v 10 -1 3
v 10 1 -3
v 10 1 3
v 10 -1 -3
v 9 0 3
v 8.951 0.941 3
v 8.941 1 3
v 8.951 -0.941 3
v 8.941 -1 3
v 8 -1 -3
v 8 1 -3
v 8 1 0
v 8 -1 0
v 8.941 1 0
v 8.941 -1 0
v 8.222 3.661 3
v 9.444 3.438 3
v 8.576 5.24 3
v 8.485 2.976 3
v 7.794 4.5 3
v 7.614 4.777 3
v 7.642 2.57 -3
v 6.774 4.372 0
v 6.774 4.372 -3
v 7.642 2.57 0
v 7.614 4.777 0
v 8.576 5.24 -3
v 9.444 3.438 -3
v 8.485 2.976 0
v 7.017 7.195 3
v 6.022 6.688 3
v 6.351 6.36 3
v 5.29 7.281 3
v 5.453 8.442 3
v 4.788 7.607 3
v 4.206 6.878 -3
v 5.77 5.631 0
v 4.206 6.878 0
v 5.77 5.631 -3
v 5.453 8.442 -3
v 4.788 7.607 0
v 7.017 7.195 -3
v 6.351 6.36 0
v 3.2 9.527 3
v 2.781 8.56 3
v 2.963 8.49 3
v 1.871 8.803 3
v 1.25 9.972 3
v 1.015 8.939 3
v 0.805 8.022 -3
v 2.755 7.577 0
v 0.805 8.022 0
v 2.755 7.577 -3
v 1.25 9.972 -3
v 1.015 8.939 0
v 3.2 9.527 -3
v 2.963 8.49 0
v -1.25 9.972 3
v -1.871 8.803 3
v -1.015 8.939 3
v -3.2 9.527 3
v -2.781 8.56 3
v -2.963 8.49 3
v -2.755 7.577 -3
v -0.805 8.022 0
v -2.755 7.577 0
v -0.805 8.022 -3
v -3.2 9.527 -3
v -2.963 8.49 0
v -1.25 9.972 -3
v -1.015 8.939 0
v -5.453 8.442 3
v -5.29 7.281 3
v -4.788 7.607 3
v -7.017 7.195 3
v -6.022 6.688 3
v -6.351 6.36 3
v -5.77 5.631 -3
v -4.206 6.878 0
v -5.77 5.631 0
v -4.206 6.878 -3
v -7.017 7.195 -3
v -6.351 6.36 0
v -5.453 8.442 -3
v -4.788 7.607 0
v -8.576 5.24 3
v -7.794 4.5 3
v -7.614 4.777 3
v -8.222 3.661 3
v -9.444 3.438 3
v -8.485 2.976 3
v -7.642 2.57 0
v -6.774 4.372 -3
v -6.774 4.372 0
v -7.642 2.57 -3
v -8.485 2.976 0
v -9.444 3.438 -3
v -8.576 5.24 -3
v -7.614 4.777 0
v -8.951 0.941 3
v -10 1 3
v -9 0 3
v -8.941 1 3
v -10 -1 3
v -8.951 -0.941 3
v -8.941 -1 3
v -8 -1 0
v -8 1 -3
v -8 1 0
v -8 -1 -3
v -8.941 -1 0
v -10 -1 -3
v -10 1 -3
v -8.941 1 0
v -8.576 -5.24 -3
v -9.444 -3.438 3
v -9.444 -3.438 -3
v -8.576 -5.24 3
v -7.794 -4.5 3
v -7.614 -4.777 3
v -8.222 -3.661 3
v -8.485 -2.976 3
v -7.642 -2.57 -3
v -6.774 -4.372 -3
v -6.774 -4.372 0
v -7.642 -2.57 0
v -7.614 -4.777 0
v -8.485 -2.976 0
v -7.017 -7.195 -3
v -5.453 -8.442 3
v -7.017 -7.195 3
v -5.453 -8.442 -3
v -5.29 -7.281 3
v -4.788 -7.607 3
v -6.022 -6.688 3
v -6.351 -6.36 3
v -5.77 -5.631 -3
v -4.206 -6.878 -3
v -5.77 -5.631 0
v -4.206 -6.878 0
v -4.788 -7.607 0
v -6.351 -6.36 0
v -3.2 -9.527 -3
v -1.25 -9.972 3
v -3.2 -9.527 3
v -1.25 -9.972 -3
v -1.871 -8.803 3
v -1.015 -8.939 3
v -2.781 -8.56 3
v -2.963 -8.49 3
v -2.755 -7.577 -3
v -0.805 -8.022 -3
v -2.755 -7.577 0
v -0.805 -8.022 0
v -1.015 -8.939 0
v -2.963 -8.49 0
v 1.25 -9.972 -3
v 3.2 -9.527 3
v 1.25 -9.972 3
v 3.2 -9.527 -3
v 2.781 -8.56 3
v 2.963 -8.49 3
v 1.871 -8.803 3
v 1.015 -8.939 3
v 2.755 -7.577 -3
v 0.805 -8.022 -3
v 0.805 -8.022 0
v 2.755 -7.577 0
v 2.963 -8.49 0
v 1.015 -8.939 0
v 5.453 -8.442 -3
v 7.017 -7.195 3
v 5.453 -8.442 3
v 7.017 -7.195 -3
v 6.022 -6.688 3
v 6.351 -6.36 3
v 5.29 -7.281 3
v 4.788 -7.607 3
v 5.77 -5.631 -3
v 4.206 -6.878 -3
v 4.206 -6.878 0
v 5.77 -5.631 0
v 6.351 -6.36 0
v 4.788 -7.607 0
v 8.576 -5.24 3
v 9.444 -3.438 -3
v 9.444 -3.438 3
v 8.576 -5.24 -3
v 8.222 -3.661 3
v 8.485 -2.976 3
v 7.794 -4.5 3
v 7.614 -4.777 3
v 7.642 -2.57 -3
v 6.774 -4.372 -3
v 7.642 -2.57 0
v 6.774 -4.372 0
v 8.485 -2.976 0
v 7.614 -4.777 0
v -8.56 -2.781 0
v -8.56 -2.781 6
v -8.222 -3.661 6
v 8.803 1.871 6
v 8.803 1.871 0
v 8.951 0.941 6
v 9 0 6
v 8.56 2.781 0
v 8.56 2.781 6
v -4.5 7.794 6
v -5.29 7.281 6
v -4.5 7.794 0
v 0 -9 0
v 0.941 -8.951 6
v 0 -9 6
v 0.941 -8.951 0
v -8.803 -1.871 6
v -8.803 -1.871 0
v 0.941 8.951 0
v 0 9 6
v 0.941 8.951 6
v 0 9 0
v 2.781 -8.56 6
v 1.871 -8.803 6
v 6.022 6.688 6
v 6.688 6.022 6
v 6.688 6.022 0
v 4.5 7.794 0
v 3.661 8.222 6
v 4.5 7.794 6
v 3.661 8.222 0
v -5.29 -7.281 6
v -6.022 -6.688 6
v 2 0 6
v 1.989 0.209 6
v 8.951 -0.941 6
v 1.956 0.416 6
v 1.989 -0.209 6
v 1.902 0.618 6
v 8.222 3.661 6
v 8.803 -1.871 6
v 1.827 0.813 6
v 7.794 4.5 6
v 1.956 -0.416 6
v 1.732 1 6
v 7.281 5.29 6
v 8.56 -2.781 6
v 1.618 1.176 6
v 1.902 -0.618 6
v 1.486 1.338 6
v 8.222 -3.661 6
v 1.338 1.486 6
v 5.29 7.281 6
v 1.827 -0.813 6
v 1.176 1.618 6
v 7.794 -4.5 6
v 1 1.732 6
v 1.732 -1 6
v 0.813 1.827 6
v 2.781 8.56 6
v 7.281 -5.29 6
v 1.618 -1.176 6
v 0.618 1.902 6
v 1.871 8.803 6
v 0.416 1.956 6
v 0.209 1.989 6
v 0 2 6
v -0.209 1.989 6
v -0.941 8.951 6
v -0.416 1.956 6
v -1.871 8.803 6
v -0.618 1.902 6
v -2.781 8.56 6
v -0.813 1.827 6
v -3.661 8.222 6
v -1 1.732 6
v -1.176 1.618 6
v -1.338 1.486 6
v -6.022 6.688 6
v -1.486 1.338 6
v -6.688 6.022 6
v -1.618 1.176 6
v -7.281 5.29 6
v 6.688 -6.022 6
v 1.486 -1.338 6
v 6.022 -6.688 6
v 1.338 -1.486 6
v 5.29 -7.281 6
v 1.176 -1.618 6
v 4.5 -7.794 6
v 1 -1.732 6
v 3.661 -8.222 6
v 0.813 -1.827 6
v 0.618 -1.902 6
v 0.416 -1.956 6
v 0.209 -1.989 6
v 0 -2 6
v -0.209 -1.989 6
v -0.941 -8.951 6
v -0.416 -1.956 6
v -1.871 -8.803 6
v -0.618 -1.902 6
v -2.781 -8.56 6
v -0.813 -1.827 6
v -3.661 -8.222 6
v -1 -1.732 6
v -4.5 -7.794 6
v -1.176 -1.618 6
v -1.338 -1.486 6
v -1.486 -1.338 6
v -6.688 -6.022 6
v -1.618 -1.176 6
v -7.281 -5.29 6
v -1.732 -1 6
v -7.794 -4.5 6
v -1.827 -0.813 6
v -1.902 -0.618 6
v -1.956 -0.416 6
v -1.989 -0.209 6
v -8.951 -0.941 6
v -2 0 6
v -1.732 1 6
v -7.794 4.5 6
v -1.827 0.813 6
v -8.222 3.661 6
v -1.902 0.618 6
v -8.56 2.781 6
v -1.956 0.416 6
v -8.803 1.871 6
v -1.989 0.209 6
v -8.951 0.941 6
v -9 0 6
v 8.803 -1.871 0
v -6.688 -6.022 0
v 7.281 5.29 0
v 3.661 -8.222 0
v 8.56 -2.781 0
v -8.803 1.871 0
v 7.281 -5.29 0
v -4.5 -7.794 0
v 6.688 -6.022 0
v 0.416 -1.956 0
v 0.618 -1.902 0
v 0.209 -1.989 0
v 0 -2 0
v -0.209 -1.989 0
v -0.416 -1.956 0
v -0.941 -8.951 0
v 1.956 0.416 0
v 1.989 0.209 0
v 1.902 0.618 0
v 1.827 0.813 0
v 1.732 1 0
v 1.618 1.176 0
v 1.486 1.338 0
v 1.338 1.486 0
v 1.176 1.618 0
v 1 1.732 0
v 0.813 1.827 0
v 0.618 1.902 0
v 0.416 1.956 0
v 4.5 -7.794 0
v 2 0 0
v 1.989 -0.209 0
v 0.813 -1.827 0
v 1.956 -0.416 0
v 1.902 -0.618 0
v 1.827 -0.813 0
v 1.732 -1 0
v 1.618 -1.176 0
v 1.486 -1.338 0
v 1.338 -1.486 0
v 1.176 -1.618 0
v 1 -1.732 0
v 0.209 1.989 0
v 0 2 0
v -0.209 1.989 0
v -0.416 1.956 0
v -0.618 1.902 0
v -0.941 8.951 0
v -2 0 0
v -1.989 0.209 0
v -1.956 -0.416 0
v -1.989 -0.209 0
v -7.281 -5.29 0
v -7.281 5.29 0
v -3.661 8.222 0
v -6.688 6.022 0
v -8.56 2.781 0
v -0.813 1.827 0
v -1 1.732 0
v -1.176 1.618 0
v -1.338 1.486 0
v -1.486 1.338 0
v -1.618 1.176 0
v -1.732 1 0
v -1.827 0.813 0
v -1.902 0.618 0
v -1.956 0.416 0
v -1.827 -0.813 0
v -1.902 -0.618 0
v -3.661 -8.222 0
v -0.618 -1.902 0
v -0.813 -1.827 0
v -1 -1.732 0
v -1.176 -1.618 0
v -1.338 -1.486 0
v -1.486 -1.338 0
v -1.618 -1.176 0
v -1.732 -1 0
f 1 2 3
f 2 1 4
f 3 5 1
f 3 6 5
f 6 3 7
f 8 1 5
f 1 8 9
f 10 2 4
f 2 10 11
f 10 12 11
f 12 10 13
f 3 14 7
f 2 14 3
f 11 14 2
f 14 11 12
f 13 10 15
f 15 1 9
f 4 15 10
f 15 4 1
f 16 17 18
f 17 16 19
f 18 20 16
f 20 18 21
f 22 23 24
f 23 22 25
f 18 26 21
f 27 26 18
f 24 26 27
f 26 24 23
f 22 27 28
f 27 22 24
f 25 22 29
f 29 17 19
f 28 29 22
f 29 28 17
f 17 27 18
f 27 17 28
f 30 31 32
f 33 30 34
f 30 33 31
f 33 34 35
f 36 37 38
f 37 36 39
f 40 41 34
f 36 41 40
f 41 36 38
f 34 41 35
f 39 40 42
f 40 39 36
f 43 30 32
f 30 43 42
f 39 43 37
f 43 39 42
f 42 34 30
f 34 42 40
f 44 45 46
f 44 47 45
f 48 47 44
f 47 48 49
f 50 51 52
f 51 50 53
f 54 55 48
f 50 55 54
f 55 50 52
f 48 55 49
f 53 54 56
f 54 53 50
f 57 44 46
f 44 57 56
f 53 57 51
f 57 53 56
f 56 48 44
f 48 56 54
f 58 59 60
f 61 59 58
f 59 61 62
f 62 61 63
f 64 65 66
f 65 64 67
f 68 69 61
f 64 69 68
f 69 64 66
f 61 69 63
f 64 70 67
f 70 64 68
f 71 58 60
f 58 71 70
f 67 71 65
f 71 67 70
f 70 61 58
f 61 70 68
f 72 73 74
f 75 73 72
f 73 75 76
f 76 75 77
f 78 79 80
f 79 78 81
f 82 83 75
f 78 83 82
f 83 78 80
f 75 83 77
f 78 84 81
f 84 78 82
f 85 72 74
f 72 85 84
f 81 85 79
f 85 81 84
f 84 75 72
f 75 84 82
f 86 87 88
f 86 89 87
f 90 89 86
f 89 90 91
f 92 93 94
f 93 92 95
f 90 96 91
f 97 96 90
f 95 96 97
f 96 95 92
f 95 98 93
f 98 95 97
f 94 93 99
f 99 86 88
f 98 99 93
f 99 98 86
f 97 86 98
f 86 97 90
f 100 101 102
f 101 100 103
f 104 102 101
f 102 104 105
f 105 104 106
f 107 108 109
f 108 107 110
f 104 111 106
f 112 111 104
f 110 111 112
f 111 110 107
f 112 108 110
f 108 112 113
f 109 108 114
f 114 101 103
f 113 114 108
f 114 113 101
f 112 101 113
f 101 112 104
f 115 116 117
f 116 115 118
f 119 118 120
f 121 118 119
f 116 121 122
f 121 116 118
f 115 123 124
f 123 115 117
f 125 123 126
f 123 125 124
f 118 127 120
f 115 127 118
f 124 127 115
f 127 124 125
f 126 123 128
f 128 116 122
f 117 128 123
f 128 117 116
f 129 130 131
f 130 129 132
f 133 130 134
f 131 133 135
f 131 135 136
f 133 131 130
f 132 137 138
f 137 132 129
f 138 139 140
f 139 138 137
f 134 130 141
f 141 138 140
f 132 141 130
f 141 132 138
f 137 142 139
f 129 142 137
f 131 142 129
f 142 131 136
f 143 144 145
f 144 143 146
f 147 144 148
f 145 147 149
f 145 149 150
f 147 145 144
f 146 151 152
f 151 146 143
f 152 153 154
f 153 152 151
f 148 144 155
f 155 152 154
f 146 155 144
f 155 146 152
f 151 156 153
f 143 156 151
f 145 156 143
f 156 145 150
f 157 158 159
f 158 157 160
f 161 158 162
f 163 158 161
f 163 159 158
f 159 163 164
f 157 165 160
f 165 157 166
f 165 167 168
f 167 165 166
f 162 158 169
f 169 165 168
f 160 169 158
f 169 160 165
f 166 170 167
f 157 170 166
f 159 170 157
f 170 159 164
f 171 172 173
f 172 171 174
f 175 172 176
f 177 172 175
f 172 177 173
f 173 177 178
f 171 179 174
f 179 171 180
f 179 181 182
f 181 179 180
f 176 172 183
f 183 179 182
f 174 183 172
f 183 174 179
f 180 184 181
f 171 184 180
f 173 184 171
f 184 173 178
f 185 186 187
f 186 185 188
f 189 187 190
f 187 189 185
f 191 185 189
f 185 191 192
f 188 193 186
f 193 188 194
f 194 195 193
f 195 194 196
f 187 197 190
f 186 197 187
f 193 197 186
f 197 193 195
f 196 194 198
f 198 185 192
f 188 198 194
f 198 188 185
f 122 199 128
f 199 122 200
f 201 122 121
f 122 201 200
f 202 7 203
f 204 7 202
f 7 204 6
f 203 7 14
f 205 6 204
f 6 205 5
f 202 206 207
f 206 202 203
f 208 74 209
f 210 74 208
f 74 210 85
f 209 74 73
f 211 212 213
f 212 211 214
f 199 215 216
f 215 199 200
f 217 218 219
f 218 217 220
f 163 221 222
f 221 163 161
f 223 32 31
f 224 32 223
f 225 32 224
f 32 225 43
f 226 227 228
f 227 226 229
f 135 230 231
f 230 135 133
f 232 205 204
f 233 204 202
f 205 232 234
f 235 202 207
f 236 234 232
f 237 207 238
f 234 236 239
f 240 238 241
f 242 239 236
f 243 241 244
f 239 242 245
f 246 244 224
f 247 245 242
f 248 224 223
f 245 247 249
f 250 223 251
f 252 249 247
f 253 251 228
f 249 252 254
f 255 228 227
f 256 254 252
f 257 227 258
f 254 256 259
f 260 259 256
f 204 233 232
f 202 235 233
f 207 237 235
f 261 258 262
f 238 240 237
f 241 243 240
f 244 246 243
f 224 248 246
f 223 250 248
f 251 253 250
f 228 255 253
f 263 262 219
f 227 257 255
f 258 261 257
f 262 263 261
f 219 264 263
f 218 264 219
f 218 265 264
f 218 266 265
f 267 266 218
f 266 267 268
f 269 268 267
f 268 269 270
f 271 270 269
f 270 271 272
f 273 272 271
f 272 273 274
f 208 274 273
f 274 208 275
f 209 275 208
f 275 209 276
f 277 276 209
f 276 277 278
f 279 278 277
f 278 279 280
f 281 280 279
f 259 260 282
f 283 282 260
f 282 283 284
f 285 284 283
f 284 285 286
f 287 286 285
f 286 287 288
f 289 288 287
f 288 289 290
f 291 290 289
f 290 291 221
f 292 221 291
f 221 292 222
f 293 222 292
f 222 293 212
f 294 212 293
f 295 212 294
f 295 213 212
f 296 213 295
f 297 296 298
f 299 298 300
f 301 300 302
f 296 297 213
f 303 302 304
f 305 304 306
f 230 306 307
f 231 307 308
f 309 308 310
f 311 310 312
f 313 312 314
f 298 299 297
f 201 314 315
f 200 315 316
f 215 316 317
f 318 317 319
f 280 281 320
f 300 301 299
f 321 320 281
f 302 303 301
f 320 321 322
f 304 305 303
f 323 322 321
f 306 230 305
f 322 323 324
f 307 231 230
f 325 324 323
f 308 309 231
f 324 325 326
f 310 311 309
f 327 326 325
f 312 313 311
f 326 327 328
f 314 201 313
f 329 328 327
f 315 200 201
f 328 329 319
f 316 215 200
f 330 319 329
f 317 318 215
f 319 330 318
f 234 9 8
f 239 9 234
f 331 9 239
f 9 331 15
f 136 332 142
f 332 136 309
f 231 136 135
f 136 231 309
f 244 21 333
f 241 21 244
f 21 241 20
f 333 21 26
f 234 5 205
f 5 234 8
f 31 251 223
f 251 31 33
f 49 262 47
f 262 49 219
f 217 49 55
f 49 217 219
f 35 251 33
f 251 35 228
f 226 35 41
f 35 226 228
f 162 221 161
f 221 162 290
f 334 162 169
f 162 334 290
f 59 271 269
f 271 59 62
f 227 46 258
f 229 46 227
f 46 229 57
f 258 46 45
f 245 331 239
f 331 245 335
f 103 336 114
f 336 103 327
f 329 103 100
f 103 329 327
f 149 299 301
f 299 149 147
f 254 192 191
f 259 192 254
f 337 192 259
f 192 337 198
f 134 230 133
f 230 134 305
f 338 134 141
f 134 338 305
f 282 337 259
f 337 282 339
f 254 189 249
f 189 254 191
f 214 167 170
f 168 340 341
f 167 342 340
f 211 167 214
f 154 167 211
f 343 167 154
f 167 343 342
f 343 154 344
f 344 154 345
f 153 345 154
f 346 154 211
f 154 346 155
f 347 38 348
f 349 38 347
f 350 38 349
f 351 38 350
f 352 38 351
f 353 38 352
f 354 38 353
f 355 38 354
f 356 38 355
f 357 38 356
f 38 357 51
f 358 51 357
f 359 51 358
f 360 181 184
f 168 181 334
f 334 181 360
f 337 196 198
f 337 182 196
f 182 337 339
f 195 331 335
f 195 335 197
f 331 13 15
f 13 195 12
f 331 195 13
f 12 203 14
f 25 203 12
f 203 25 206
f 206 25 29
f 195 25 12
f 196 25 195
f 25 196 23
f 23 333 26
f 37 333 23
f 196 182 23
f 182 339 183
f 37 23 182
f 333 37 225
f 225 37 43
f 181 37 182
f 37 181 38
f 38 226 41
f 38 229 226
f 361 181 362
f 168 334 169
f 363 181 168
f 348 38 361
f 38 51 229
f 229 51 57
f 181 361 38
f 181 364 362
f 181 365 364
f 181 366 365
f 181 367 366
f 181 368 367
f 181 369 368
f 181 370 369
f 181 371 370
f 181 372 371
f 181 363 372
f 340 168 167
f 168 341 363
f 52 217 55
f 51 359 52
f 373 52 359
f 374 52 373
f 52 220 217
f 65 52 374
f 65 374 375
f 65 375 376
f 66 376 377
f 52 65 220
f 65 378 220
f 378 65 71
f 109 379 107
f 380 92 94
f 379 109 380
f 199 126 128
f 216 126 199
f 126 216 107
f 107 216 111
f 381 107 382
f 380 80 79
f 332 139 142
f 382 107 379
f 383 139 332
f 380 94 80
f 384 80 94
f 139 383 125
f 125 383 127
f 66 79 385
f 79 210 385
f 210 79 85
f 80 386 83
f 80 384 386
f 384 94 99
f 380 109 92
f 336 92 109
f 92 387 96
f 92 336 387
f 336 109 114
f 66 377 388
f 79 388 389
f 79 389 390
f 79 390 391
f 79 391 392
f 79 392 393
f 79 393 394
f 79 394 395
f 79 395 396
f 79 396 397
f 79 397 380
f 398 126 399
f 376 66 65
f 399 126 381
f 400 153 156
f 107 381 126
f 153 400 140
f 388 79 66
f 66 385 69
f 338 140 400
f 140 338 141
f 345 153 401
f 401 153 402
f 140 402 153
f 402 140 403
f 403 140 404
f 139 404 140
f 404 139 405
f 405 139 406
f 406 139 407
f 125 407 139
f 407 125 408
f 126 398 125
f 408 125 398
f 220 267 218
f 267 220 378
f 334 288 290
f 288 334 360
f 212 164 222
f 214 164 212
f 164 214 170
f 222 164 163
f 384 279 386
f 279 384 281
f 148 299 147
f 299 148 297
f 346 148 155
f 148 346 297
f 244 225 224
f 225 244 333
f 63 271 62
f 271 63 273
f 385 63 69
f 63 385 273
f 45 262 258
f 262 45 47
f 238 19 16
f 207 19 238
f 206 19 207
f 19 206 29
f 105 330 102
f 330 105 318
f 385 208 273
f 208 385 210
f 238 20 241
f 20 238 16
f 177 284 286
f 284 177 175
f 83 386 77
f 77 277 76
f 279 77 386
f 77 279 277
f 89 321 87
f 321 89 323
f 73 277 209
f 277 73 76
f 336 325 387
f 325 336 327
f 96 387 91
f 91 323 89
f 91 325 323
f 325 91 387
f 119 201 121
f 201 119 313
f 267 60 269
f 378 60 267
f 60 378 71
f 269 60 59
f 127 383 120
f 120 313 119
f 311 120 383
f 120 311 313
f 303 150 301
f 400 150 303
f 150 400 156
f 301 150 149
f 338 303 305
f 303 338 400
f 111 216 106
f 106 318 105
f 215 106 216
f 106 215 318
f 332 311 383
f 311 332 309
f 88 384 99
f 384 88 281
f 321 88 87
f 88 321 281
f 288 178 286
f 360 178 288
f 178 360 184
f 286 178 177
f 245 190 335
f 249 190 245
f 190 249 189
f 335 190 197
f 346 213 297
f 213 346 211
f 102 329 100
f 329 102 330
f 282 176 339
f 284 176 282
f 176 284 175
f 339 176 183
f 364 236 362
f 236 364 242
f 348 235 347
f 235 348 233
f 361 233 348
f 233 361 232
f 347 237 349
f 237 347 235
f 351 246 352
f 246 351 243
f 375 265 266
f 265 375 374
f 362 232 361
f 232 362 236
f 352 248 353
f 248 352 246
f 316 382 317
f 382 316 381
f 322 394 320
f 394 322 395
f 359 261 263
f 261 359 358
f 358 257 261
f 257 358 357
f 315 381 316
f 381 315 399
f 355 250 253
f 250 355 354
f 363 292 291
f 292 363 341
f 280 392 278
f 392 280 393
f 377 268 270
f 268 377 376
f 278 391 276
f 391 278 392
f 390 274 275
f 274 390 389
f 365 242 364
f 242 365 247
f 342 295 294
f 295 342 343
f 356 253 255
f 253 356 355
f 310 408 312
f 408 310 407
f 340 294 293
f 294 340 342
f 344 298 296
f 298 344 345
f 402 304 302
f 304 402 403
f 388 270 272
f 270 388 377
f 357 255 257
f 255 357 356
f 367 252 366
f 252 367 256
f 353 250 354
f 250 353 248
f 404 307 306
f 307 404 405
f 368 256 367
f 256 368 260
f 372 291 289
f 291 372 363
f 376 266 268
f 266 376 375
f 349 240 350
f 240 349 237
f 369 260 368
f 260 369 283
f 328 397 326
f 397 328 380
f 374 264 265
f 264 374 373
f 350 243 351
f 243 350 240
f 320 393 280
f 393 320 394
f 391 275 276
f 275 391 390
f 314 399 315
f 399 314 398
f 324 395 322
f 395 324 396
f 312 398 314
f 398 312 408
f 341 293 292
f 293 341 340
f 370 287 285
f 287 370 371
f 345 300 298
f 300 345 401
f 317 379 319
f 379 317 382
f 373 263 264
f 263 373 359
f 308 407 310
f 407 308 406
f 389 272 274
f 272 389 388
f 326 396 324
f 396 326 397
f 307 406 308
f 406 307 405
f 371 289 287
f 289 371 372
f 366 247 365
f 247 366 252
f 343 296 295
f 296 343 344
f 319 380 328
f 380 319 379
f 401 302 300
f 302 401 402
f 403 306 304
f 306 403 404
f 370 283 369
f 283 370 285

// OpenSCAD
// Gear blank with external locator teeth.
$fn = 60;
eps = 0.02;
bore_d = 4;
root_d = 18;
teeth = 14;
thickness = 6;
difference() { union() { cylinder(d=root_d,h=thickness); for(i=[0:teeth-1]) rotate([0,0,i*360/teeth]) translate([root_d/2,0,0]) cube([2,max(2,root_d*0.08),thickness],center=true); } translate([0,0,-eps]) cylinder(d=bore_d,h=thickness+2*eps); }
